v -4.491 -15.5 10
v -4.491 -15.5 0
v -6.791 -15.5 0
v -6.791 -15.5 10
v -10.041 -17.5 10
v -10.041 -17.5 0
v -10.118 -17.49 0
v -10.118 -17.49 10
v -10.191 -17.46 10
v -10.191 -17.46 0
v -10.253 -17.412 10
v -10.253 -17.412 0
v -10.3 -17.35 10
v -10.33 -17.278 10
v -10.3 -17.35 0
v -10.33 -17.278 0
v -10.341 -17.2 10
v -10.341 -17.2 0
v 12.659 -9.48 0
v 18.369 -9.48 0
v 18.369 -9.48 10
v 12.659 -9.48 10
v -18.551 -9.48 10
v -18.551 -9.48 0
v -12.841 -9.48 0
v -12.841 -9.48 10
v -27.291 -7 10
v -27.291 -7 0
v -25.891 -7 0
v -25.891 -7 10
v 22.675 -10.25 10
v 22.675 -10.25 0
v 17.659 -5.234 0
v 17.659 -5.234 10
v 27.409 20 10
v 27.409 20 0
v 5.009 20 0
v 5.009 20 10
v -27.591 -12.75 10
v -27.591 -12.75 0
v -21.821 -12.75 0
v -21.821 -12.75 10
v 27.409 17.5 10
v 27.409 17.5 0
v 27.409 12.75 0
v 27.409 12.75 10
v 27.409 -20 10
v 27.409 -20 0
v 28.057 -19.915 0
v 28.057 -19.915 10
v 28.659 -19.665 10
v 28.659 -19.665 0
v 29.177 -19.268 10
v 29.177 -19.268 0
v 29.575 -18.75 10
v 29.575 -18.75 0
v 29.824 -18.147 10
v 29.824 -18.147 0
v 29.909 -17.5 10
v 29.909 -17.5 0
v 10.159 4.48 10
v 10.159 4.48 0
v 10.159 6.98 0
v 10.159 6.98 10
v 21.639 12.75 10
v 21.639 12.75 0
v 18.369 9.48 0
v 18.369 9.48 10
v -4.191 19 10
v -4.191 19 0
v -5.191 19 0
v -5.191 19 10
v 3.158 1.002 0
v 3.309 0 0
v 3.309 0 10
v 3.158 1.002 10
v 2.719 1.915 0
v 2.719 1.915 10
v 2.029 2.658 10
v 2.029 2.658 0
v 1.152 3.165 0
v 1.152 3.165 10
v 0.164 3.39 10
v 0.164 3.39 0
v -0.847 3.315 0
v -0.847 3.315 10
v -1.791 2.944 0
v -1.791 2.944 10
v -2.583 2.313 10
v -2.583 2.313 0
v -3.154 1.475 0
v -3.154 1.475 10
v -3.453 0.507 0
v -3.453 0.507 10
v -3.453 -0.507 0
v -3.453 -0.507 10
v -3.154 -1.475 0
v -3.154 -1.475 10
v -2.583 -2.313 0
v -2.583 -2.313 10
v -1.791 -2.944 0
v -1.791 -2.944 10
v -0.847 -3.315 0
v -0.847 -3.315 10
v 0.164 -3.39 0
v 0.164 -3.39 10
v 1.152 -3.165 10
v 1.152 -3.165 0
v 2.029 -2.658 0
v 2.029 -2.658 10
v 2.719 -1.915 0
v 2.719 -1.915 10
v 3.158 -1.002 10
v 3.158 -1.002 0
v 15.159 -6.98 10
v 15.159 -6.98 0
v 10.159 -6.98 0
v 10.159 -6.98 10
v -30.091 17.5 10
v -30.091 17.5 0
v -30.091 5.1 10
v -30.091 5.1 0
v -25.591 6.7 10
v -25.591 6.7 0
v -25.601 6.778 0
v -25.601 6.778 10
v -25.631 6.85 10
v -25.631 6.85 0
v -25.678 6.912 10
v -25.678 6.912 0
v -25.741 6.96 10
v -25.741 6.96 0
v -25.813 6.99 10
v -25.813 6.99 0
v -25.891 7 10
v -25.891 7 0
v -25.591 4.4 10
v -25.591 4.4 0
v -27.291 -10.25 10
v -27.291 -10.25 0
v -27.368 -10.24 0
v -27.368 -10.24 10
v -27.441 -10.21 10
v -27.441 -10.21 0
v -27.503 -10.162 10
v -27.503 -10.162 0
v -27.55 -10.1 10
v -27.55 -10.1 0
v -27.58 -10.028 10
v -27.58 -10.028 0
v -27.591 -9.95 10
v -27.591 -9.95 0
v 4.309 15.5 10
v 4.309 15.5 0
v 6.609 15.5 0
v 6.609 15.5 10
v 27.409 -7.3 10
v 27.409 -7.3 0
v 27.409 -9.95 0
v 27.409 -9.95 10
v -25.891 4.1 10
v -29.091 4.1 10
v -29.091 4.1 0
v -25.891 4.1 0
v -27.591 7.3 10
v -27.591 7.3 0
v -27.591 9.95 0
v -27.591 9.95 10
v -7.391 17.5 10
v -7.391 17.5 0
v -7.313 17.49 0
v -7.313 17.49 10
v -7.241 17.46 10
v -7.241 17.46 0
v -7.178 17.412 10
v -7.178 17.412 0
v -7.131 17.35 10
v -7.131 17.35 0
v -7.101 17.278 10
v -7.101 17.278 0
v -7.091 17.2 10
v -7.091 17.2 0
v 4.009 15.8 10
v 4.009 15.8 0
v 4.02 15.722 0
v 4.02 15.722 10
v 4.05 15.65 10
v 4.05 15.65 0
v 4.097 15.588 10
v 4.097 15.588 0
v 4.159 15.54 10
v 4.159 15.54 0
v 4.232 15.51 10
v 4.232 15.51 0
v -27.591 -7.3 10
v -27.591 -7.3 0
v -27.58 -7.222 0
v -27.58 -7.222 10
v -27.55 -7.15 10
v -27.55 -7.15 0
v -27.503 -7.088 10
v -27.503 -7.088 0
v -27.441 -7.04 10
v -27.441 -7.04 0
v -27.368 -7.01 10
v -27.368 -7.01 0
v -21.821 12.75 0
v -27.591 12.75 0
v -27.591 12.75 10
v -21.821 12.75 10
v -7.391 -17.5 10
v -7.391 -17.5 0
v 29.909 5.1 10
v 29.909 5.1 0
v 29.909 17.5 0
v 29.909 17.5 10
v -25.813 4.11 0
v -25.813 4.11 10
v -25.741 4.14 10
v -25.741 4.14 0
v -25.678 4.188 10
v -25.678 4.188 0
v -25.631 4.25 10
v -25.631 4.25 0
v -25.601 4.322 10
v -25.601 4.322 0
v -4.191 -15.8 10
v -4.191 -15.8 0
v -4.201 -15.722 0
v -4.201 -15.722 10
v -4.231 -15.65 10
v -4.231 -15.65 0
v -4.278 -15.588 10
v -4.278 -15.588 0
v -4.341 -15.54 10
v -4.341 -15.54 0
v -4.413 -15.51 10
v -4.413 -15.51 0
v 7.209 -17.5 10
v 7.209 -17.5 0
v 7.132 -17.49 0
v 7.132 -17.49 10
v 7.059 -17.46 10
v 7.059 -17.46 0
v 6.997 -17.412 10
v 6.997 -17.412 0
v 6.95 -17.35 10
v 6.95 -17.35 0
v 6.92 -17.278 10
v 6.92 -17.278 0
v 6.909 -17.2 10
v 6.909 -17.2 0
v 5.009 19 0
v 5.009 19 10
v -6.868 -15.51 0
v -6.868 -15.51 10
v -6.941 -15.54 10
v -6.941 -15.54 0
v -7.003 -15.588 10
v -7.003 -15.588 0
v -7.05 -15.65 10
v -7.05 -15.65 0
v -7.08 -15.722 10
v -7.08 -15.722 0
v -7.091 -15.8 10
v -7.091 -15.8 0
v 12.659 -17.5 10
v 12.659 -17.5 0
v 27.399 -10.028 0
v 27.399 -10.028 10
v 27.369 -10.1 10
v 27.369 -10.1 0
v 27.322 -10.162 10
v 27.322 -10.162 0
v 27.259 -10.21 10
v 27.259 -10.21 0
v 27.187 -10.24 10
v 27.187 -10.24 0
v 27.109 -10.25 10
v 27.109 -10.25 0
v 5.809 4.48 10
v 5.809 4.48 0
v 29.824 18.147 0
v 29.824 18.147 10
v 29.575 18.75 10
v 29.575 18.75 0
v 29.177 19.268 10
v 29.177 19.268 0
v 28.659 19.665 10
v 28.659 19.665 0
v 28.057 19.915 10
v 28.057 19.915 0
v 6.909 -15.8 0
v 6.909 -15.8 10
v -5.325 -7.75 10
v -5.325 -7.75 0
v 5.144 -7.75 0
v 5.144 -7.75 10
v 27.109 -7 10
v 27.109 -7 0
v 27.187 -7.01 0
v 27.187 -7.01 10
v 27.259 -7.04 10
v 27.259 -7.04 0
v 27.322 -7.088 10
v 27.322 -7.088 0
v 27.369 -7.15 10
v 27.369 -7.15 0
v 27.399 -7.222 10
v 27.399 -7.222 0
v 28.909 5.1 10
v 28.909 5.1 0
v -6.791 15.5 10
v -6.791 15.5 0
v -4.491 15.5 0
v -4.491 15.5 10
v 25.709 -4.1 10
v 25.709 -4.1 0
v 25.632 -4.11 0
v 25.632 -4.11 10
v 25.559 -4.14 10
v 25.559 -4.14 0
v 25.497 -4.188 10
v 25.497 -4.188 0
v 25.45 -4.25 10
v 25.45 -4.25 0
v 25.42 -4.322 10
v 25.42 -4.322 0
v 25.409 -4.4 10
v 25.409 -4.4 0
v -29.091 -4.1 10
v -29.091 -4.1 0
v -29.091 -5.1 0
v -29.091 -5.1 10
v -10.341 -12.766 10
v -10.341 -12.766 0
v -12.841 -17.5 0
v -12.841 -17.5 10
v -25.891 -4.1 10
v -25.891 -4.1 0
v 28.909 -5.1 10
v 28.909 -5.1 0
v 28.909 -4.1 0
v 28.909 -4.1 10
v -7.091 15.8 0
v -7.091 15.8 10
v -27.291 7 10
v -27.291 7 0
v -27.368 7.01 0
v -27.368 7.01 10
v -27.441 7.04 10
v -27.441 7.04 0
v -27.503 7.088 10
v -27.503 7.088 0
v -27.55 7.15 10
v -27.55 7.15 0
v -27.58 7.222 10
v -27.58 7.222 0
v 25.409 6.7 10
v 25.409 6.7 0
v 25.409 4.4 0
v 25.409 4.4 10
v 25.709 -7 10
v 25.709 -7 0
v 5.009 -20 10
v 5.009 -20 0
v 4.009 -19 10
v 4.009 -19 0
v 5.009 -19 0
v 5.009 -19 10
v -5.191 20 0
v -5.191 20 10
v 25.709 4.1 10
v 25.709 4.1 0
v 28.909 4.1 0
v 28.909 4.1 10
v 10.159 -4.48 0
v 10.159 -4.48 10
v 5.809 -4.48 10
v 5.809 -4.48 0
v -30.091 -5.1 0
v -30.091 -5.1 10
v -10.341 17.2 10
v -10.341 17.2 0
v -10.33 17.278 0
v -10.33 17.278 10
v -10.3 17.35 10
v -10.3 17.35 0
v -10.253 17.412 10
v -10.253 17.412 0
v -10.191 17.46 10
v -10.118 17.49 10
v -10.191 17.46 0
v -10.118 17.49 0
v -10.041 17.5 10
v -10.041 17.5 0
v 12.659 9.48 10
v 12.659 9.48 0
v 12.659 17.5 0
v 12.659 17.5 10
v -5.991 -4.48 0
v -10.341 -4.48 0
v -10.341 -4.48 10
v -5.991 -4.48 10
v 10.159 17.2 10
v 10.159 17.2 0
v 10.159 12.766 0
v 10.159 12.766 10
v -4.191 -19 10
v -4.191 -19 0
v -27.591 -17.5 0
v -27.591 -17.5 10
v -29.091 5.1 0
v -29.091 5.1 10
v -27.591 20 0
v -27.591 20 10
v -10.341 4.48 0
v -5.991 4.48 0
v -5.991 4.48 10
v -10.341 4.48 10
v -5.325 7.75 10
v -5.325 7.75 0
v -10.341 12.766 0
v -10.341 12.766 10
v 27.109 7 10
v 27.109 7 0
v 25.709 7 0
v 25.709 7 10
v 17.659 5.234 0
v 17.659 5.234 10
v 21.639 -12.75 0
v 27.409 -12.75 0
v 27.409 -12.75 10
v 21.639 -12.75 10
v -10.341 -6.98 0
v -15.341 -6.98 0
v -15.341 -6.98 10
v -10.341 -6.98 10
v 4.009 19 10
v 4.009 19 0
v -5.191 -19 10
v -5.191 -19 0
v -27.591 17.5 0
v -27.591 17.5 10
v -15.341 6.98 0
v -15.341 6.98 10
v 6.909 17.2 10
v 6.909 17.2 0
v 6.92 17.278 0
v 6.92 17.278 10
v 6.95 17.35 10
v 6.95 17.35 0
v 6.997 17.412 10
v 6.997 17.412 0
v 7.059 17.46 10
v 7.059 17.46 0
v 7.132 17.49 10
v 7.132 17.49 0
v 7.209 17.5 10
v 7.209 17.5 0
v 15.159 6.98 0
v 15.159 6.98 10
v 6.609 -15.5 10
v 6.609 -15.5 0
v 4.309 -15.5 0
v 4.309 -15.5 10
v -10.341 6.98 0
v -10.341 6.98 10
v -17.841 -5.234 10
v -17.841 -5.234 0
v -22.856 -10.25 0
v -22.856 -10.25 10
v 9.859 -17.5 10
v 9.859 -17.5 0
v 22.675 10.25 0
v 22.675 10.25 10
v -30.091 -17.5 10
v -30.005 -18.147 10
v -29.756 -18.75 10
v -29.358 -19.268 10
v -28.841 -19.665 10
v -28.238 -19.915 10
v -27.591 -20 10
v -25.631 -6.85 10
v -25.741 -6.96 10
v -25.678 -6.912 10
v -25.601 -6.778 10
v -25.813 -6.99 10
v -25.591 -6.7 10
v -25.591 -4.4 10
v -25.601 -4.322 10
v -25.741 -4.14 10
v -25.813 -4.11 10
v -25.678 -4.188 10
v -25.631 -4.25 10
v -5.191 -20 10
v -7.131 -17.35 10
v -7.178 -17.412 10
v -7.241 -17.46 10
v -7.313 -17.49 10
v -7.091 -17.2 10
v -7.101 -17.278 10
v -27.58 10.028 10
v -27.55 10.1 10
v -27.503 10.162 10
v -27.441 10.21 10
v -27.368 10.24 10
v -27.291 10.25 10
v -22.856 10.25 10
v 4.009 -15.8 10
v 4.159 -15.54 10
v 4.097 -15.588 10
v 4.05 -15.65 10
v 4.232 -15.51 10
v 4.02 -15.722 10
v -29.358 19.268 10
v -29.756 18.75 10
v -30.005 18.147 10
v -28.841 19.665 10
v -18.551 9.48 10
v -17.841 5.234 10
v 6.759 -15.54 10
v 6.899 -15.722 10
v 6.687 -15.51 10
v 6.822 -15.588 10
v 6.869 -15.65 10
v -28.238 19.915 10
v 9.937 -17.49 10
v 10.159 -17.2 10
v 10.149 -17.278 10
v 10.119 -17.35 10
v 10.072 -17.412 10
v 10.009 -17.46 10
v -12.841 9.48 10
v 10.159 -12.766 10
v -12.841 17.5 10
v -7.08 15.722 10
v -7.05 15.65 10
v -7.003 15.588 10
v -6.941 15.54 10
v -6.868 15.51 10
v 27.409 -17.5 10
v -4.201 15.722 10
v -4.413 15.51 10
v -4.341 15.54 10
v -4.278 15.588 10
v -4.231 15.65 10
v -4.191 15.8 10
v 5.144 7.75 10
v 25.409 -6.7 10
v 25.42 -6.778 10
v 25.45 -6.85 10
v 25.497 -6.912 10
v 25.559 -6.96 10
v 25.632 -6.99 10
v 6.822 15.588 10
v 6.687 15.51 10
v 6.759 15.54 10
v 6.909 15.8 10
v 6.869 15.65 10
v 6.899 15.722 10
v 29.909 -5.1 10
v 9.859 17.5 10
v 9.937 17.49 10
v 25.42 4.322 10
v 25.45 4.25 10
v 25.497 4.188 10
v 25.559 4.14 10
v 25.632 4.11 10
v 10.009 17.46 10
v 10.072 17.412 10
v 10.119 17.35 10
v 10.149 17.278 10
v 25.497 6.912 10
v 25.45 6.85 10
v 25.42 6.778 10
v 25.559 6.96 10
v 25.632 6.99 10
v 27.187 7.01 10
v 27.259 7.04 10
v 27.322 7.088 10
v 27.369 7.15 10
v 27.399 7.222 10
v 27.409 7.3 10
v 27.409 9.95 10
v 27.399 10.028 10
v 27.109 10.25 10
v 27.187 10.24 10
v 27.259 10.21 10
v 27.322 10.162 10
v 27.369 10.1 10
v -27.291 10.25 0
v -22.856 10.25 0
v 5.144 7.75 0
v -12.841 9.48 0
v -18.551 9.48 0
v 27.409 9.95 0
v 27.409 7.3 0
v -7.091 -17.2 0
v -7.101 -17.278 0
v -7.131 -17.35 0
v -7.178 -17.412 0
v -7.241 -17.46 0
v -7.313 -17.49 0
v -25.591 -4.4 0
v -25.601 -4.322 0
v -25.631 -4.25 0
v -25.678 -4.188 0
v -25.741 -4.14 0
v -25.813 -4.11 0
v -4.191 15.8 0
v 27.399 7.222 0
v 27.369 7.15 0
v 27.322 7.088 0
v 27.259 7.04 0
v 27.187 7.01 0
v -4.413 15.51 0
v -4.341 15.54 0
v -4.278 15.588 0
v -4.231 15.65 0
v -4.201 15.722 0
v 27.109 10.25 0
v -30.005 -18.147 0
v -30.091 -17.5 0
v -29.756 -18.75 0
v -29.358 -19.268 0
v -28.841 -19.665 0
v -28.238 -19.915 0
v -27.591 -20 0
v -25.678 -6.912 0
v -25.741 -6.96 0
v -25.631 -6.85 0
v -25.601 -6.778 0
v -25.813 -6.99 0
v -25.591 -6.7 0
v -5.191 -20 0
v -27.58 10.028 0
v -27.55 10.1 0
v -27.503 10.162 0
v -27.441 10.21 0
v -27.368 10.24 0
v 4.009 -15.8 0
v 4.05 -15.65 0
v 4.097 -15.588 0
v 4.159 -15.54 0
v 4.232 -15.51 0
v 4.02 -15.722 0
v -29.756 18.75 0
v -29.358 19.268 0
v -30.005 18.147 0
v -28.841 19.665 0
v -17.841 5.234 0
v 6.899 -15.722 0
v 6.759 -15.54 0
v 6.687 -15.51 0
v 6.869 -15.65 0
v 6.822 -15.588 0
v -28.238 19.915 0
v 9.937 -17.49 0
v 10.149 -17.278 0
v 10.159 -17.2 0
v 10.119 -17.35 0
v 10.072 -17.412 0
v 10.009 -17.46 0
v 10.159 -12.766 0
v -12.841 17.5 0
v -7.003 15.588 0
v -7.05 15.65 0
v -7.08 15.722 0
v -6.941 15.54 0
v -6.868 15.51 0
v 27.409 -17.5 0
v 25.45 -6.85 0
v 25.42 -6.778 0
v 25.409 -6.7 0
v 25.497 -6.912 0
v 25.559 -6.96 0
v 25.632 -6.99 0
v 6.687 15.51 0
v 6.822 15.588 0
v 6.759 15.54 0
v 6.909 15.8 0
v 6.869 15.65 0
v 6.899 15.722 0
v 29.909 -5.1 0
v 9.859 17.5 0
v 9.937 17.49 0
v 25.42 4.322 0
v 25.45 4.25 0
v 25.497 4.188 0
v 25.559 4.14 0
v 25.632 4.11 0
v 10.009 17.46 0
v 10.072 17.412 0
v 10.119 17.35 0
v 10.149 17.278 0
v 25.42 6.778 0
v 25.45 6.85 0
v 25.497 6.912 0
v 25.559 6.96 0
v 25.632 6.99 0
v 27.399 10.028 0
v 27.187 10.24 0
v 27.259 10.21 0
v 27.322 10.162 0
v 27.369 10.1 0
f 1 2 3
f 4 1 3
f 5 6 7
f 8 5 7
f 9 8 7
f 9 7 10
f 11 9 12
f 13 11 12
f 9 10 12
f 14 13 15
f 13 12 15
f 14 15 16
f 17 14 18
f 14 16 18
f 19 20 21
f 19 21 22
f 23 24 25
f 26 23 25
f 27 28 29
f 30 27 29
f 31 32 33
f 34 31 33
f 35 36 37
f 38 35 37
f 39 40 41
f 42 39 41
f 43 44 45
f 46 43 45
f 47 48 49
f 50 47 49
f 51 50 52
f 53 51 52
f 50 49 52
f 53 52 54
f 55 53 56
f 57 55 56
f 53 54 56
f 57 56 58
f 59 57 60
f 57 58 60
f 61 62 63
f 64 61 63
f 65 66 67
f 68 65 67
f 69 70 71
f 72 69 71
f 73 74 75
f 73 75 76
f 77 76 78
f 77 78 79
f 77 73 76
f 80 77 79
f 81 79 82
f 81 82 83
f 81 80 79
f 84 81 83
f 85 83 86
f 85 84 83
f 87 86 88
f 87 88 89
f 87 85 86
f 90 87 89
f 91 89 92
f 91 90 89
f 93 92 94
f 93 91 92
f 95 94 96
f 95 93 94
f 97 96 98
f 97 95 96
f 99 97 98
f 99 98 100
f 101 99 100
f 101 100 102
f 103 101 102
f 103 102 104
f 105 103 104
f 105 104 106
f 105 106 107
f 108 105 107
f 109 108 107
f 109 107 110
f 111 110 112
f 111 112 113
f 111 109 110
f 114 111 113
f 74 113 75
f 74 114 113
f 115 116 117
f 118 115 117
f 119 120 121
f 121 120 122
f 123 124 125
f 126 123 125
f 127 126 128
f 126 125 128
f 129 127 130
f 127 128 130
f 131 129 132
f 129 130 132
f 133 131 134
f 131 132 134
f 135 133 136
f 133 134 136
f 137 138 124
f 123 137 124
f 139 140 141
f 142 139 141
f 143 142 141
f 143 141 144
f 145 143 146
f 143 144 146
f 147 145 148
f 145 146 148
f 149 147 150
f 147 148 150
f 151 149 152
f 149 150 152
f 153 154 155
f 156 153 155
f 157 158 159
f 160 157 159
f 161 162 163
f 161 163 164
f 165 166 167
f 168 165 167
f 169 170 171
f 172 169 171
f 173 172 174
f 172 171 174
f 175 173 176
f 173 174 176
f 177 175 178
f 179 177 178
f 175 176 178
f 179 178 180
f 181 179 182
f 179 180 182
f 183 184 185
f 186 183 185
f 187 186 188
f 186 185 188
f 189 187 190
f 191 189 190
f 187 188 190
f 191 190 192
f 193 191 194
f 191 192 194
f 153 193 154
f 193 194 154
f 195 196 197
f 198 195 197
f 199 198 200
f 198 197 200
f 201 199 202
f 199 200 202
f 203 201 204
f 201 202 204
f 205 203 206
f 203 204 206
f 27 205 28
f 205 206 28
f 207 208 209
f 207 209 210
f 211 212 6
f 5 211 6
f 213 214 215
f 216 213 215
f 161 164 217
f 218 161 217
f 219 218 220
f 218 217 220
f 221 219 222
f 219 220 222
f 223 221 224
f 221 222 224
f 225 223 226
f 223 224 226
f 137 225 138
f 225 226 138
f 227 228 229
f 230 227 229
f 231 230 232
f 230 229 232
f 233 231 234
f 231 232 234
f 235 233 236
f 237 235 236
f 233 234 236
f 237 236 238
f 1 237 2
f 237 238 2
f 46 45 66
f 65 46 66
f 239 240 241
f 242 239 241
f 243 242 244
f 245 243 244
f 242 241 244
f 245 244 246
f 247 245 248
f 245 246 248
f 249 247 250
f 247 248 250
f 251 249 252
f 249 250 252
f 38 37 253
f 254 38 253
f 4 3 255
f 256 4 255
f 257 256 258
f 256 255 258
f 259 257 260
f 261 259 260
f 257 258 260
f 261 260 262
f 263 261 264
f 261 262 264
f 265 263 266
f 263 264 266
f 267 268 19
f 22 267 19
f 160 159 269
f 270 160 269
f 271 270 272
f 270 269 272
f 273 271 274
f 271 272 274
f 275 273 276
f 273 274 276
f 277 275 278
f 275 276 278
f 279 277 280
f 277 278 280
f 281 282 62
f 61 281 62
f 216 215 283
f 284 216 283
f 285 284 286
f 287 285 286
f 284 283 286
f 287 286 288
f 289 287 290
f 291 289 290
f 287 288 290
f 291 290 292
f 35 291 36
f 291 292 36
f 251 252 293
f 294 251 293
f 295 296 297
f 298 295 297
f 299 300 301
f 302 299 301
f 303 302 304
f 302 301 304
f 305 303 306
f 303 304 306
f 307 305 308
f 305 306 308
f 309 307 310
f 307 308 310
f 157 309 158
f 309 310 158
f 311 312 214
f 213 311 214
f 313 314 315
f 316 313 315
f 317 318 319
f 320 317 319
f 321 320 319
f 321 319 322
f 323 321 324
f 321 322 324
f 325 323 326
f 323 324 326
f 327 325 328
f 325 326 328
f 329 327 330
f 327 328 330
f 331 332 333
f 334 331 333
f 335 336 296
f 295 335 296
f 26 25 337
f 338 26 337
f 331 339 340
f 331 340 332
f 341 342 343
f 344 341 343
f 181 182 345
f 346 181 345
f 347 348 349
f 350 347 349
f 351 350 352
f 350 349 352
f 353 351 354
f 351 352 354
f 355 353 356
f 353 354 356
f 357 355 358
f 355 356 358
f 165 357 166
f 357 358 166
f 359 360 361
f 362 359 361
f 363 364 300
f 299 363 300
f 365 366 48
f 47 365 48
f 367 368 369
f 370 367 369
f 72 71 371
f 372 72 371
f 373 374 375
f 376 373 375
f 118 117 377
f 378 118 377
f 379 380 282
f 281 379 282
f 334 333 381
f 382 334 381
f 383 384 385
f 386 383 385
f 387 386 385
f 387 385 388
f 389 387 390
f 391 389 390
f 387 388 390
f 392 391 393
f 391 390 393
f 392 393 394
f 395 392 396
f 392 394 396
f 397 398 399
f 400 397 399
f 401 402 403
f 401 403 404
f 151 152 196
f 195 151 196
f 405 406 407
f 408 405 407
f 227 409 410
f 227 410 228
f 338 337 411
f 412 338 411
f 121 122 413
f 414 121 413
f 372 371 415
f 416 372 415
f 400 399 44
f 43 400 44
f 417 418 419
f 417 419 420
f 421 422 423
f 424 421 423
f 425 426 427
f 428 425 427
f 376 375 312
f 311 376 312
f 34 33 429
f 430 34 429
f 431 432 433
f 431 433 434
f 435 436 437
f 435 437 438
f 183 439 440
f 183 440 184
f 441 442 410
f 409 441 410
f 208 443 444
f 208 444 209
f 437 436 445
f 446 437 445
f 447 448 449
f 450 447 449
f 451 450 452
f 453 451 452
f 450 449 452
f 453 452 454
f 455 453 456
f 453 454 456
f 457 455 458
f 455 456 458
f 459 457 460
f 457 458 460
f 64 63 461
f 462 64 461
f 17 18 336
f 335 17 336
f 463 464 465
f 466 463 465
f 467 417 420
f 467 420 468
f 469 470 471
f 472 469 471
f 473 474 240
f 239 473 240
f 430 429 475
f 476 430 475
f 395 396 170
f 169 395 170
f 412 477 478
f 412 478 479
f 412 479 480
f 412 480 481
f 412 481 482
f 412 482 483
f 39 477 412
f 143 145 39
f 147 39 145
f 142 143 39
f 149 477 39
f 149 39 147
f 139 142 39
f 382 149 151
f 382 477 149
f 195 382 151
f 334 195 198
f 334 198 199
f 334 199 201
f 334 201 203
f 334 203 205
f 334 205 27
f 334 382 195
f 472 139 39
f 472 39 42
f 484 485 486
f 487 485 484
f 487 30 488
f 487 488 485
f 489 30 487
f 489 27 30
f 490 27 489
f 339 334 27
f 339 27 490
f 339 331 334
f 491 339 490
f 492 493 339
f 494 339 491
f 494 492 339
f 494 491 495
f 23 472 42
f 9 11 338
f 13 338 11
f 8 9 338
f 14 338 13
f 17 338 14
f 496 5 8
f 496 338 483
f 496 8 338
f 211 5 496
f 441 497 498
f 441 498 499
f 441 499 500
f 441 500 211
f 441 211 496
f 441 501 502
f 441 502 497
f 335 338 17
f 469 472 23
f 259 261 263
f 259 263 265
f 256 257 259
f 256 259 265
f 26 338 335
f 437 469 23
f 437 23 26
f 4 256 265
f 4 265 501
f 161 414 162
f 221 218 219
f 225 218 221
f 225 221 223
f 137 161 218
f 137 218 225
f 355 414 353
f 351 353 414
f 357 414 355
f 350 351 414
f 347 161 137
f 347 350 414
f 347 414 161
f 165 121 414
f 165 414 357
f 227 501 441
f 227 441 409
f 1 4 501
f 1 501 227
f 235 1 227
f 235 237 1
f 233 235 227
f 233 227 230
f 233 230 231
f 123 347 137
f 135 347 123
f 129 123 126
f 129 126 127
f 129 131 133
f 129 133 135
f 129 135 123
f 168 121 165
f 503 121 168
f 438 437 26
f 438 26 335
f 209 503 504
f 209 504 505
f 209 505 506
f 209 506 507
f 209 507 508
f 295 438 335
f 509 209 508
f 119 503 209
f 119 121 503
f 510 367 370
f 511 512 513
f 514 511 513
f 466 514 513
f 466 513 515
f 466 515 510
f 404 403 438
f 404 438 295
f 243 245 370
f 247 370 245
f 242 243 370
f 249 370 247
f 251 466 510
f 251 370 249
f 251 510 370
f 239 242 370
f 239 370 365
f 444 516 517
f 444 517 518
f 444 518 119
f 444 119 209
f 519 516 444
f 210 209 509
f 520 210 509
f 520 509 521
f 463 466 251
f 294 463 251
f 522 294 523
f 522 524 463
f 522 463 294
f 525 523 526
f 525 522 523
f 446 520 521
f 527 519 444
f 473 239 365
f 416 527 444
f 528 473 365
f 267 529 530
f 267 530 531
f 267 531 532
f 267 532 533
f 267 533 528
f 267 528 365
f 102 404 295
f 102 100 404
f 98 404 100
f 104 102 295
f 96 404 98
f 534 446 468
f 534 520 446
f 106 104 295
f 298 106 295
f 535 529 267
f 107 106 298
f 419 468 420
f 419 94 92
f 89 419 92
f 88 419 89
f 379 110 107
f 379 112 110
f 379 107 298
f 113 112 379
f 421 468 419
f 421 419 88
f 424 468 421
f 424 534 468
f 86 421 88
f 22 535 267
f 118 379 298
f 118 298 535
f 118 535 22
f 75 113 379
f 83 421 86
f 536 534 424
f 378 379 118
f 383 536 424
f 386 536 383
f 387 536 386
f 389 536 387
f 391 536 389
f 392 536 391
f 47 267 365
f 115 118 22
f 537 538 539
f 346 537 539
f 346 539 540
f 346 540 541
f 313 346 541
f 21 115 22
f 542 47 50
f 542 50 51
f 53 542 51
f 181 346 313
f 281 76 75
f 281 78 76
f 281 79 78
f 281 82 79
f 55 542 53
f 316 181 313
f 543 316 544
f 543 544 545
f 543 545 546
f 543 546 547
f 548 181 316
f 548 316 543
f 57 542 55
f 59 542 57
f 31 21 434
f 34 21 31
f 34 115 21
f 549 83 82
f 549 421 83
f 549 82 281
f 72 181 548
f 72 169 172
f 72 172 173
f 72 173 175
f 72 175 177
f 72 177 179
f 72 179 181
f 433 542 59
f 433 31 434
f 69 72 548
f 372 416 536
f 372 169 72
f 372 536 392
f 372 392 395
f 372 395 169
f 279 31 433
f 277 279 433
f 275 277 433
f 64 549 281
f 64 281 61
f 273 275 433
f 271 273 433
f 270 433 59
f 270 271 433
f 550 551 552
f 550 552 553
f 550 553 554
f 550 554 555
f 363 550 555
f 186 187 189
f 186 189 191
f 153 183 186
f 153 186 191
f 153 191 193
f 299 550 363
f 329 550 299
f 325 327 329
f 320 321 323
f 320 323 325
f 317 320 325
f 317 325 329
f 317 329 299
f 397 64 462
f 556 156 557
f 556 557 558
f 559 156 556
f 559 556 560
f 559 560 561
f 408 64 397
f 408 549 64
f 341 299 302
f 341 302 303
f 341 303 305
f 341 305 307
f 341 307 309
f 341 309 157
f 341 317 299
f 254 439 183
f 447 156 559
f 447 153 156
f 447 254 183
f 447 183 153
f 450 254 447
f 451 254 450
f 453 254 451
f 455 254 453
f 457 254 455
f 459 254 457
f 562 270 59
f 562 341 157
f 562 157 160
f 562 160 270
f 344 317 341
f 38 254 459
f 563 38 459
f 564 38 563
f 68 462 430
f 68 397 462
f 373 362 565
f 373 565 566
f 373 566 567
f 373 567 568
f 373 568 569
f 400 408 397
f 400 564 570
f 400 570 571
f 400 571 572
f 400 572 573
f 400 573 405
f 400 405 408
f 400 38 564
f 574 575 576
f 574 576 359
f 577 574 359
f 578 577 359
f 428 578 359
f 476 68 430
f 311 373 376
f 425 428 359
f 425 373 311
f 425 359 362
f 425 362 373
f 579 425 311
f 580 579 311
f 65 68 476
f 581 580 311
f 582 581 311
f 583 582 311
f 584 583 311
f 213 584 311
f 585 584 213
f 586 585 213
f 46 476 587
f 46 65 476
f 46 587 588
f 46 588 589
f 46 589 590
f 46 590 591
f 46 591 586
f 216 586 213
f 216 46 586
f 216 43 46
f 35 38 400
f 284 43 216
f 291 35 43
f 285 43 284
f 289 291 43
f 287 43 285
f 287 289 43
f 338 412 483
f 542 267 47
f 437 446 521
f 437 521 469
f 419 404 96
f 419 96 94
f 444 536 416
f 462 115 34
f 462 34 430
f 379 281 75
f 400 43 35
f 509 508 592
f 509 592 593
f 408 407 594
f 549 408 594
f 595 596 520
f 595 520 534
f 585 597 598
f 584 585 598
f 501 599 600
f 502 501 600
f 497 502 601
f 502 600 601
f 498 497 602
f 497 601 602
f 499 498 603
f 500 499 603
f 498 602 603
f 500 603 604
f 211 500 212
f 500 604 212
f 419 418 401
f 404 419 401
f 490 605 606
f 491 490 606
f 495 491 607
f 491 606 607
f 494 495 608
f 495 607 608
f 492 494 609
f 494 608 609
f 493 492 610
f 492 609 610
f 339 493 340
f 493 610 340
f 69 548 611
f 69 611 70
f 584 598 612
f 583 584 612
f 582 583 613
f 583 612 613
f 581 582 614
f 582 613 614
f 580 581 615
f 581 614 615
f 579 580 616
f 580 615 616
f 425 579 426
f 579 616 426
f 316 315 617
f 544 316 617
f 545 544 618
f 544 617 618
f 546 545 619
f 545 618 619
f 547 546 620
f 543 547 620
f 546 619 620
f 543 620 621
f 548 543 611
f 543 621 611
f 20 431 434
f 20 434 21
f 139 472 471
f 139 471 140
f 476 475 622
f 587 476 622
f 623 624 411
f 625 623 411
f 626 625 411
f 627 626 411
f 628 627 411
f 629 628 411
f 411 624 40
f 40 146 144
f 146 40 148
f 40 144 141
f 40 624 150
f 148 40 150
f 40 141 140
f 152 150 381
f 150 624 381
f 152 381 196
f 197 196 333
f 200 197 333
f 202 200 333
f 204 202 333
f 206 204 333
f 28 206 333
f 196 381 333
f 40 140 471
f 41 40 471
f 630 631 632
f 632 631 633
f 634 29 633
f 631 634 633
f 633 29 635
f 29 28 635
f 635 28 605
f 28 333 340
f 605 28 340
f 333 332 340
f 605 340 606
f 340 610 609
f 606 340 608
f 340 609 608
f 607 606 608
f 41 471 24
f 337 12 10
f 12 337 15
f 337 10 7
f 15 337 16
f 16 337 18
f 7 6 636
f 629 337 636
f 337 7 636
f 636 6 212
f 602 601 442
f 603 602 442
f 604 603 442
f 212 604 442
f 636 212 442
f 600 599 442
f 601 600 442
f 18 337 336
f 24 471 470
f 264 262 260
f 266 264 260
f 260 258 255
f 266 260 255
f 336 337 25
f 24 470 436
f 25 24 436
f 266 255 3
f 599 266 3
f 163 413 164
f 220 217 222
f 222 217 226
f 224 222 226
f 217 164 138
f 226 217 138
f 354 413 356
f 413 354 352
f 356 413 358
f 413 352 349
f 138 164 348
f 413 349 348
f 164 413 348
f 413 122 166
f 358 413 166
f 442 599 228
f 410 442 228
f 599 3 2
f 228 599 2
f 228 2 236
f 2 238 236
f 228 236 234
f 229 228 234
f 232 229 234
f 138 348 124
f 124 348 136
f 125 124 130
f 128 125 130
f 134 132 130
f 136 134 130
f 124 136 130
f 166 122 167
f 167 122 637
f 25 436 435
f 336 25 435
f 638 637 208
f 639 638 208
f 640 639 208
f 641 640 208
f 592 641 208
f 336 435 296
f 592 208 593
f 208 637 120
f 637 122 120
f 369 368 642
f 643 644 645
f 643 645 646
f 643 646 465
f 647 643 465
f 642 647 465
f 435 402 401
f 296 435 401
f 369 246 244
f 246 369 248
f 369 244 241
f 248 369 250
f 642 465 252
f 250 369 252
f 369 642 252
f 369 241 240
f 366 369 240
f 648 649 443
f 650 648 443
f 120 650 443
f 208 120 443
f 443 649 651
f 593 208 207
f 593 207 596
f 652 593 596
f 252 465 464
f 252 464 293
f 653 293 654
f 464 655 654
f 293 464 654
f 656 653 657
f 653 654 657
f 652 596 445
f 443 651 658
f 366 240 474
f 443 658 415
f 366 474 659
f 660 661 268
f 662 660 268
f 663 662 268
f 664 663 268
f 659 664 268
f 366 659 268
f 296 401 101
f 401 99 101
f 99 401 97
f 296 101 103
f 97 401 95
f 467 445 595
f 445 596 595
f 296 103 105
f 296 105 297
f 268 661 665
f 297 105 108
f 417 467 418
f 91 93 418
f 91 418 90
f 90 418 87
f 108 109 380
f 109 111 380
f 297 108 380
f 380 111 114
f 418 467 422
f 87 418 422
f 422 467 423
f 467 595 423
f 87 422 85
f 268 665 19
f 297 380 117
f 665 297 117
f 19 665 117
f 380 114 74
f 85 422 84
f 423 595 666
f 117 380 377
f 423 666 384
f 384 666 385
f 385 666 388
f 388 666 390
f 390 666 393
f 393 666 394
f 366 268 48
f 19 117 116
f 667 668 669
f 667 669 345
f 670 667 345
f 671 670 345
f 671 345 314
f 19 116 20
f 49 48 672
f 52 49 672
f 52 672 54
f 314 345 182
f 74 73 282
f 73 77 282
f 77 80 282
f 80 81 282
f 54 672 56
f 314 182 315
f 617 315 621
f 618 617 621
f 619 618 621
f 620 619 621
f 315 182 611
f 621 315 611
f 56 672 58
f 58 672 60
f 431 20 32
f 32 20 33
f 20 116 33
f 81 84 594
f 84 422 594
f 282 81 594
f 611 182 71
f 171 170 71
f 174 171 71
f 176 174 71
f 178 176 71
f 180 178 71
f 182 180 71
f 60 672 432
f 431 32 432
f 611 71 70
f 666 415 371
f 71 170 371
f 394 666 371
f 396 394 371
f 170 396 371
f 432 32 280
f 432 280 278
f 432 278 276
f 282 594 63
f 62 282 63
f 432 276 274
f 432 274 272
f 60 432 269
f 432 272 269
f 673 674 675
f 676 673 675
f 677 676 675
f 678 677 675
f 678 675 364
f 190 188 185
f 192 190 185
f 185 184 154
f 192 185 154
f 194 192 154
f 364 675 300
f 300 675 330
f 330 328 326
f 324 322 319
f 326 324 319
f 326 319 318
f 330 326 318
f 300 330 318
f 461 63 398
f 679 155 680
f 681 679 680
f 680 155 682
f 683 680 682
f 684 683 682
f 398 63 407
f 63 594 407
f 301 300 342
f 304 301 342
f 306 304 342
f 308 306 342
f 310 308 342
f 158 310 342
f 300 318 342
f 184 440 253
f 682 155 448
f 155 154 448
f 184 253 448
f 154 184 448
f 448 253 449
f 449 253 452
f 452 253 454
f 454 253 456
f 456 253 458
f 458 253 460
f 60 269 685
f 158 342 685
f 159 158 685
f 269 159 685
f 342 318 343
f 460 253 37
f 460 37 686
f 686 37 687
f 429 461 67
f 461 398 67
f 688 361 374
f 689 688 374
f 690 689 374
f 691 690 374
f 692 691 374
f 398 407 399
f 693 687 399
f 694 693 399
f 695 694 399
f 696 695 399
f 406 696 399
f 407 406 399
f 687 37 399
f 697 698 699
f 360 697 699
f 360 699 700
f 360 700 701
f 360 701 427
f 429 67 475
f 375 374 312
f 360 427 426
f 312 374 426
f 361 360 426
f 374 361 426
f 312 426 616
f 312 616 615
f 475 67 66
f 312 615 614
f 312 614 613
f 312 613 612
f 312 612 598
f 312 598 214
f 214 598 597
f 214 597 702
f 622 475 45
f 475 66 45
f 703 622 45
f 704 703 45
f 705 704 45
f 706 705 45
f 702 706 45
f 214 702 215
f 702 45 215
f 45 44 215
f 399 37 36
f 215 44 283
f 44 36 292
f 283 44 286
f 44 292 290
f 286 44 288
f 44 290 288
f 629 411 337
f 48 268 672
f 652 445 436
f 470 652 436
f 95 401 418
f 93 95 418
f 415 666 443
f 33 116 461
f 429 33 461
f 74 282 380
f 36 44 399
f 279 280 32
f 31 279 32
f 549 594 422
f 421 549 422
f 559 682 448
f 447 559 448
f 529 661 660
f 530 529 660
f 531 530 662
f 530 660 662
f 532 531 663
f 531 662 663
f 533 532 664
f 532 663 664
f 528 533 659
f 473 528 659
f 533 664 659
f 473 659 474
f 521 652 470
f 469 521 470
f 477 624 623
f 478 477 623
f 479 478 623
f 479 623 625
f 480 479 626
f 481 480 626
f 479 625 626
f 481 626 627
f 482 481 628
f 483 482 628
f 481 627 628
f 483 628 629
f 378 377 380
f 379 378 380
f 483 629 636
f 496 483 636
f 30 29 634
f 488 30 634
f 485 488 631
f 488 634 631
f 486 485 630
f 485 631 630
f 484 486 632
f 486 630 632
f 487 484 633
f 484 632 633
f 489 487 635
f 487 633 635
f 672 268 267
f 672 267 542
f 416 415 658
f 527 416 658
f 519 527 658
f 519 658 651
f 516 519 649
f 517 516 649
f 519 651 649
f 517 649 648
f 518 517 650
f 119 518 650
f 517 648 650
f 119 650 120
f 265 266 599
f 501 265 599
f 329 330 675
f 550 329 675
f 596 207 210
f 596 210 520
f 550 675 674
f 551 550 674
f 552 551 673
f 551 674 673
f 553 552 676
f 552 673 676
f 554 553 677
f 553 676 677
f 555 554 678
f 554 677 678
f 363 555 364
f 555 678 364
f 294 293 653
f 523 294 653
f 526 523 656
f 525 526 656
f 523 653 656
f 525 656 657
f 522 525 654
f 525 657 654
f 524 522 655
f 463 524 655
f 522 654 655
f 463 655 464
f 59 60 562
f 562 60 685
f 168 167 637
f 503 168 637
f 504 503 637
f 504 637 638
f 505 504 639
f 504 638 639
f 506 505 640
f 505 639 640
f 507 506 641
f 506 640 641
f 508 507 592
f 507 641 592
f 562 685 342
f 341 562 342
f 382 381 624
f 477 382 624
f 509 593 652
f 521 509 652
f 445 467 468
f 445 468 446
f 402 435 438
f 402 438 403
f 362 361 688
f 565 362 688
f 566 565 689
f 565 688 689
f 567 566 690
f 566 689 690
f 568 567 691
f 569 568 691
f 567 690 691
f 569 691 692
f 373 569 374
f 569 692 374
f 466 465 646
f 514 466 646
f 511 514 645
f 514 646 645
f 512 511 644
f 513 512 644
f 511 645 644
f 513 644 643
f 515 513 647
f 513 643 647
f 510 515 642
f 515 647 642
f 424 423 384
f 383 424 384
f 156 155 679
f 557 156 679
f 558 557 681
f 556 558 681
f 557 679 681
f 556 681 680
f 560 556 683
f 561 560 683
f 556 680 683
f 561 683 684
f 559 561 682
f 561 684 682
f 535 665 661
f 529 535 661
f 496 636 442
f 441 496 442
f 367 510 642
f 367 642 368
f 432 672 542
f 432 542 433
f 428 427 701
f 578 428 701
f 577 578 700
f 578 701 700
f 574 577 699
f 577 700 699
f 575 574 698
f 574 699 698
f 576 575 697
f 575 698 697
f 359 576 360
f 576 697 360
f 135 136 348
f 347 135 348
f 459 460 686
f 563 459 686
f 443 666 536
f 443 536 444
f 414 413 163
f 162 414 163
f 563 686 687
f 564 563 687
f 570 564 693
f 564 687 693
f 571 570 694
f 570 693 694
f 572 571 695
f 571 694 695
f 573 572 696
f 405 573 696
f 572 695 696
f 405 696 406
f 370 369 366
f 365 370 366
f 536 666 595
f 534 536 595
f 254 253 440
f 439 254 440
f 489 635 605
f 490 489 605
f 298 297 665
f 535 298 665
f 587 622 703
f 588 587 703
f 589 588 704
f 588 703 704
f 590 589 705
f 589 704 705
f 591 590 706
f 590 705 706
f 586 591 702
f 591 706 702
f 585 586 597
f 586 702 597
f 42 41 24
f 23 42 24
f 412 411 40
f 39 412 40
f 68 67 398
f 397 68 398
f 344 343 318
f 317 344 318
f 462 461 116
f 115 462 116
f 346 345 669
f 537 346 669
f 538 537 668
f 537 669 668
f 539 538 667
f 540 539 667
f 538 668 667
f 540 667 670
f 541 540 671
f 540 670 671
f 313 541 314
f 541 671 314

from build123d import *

# Parameters (mm, degrees)
SKETCH_1_R      = 3.4
EXTRUDE_1_DEPTH = 10


with BuildPart() as part:
    # 草图1 → 凸台-拉伸1 (new body)
    with BuildSketch(Plane.XY):
        with BuildLine():
            Line((-5.190537873, 20), (-27.590537873, 20))
            ThreePointArc((-27.590537873, 20), (-29.358304826, 19.267766953), (-30.090537873, 17.5))
            Line((-30.090537873, 17.5), (-30.090537873, 5.1))
            Line((-30.090537873, 5.1), (-29.090537873, 5.1))
            Line((-29.090537873, 5.1), (-29.090537873, 4.1))
            Line((-29.090537873, 4.1), (-25.890537873, 4.1))
            ThreePointArc((-25.890537873, 4.1), (-25.678405839, 4.187867966), (-25.590537873, 4.4))
            Line((-25.590537873, 4.4), (-25.590537873, 6.7))
            ThreePointArc((-25.590537873, 6.7), (-25.678405839, 6.912132034), (-25.890537873, 7))
            Line((-25.890537873, 7), (-27.290537873, 7))
            ThreePointArc((-27.290537873, 7), (-27.502669908, 7.087867966), (-27.590537873, 7.3))
            Line((-27.590537873, 7.3), (-27.590537873, 9.95))
            ThreePointArc((-27.590537873, 9.95), (-27.502669908, 10.162132034), (-27.290537873, 10.25))
            Line((-27.290537873, 10.25), (-22.856071779, 10.25))
            Line((-22.856071779, 10.25), (-17.840537873, 5.234466094))
            Line((-17.840537873, 5.234466094), (-17.840537873, 0))
            Line((-17.840537873, 0), (-17.840537873, -5.234466094))
            Line((-17.840537873, -5.234466094), (-22.856071779, -10.25))
            Line((-22.856071779, -10.25), (-27.290537873, -10.25))
            ThreePointArc((-27.290537873, -10.25), (-27.502669908, -10.162132034), (-27.590537873, -9.95))
            Line((-27.590537873, -9.95), (-27.590537873, -7.3))
            ThreePointArc((-27.590537873, -7.3), (-27.502669908, -7.087867966), (-27.290537873, -7))
            Line((-27.290537873, -7), (-25.890537873, -7))
            ThreePointArc((-25.890537873, -7), (-25.678405839, -6.912132034), (-25.590537873, -6.7))
            Line((-25.590537873, -6.7), (-25.590537873, -4.4))
            ThreePointArc((-25.590537873, -4.4), (-25.678405839, -4.187867966), (-25.890537873, -4.1))
            Line((-25.890537873, -4.1), (-29.090537873, -4.1))
            Line((-29.090537873, -4.1), (-29.090537873, -5.1))
            Line((-29.090537873, -5.1), (-30.090537873, -5.1))
            Line((-30.090537873, -5.1), (-30.090537873, -17.5))
            ThreePointArc((-30.090537873, -17.5), (-29.358304826, -19.267766953), (-27.590537873, -20))
            Line((-27.590537873, -20), (-5.190537873, -20))
            Line((-5.190537873, -20), (-5.190537873, -19))
            Line((-5.190537873, -19), (-4.190537873, -19))
            Line((-4.190537873, -19), (-4.190537873, -15.8))
            ThreePointArc((-4.190537873, -15.8), (-4.278405839, -15.587867966), (-4.490537873, -15.5))
            Line((-4.490537873, -15.5), (-6.790537873, -15.5))
            ThreePointArc((-6.790537873, -15.5), (-7.002669908, -15.587867966), (-7.090537873, -15.8))
            Line((-7.090537873, -15.8), (-7.090537873, -17.2))
            ThreePointArc((-7.090537873, -17.2), (-7.178405839, -17.412132034), (-7.390537873, -17.5))
            Line((-7.390537873, -17.5), (-10.040537873, -17.5))
            ThreePointArc((-10.040537873, -17.5), (-10.252669908, -17.412132034), (-10.340537873, -17.2))
            Line((-10.340537873, -17.2), (-10.340537873, -12.765533906))
            Line((-10.340537873, -12.765533906), (-5.325003967, -7.75))
            Line((-5.325003967, -7.75), (-0.090537873, -7.75))
            Line((-0.090537873, -7.75), (5.143928221, -7.75))
            Line((5.143928221, -7.75), (10.159462127, -12.765533906))
            Line((10.159462127, -12.765533906), (10.159462127, -17.2))
            ThreePointArc((10.159462127, -17.2), (10.071594161, -17.412132034), (9.859462127, -17.5))
            Line((9.859462127, -17.5), (7.209462127, -17.5))
            ThreePointArc((7.209462127, -17.5), (6.997330092, -17.412132034), (6.909462127, -17.2))
            Line((6.909462127, -17.2), (6.909462127, -15.8))
            ThreePointArc((6.909462127, -15.8), (6.821594161, -15.587867966), (6.609462127, -15.5))
            Line((6.609462127, -15.5), (4.309462127, -15.5))
            ThreePointArc((4.309462127, -15.5), (4.097330092, -15.587867966), (4.009462127, -15.8))
            Line((4.009462127, -15.8), (4.009462127, -19))
            Line((4.009462127, -19), (5.009462127, -19))
            Line((5.009462127, -19), (5.009462127, -20))
            Line((5.009462127, -20), (27.409462127, -20))
            ThreePointArc((27.409462127, -20), (29.17722908, -19.267766953), (29.909462127, -17.5))
            Line((29.909462127, -17.5), (29.909462127, -5.1))
            Line((29.909462127, -5.1), (28.909462127, -5.1))
            Line((28.909462127, -5.1), (28.909462127, -4.1))
            Line((28.909462127, -4.1), (25.709462127, -4.1))
            ThreePointArc((25.709462127, -4.1), (25.497330092, -4.187867966), (25.409462127, -4.4))
            Line((25.409462127, -4.4), (25.409462127, -6.7))
            ThreePointArc((25.409462127, -6.7), (25.497330092, -6.912132034), (25.709462127, -7))
            Line((25.709462127, -7), (27.109462127, -7))
            ThreePointArc((27.109462127, -7), (27.321594161, -7.087867966), (27.409462127, -7.3))
            Line((27.409462127, -7.3), (27.409462127, -9.95))
            ThreePointArc((27.409462127, -9.95), (27.321594161, -10.162132034), (27.109462127, -10.25))
            Line((27.109462127, -10.25), (22.674996033, -10.25))
            Line((22.674996033, -10.25), (17.659462127, -5.234466094))
            Line((17.659462127, -5.234466094), (17.659462127, 0))
            Line((17.659462127, 0), (17.659462127, 5.234466094))
            Line((17.659462127, 5.234466094), (22.674996033, 10.25))
            Line((22.674996033, 10.25), (27.109462127, 10.25))
            ThreePointArc((27.109462127, 10.25), (27.321594161, 10.162132034), (27.409462127, 9.95))
            Line((27.409462127, 9.95), (27.409462127, 7.3))
            ThreePointArc((27.409462127, 7.3), (27.321594161, 7.087867966), (27.109462127, 7))
            Line((27.109462127, 7), (25.709462127, 7))
            ThreePointArc((25.709462127, 7), (25.497330092, 6.912132034), (25.409462127, 6.7))
            Line((25.409462127, 6.7), (25.409462127, 4.4))
            ThreePointArc((25.409462127, 4.4), (25.497330092, 4.187867966), (25.709462127, 4.1))
            Line((25.709462127, 4.1), (28.909462127, 4.1))
            Line((28.909462127, 4.1), (28.909462127, 5.1))
            Line((28.909462127, 5.1), (29.909462127, 5.1))
            Line((29.909462127, 5.1), (29.909462127, 17.5))
            ThreePointArc((29.909462127, 17.5), (29.17722908, 19.267766953), (27.409462127, 20))
            Line((27.409462127, 20), (5.009462127, 20))
            Line((5.009462127, 20), (5.009462127, 19))
            Line((5.009462127, 19), (4.009462127, 19))
            Line((4.009462127, 19), (4.009462127, 15.8))
            ThreePointArc((4.009462127, 15.8), (4.097330092, 15.587867966), (4.309462127, 15.5))
            Line((4.309462127, 15.5), (6.609462127, 15.5))
            ThreePointArc((6.609462127, 15.5), (6.821594161, 15.587867966), (6.909462127, 15.8))
            Line((6.909462127, 15.8), (6.909462127, 17.2))
            ThreePointArc((6.909462127, 17.2), (6.997330092, 17.412132034), (7.209462127, 17.5))
            Line((7.209462127, 17.5), (9.859462127, 17.5))
            ThreePointArc((9.859462127, 17.5), (10.071594161, 17.412132034), (10.159462127, 17.2))
            Line((10.159462127, 17.2), (10.159462127, 12.765533906))
            Line((10.159462127, 12.765533906), (5.143928221, 7.75))
            Line((5.143928221, 7.75), (-0.090537873, 7.75))
            Line((-0.090537873, 7.75), (-5.325003967, 7.75))
            Line((-5.325003967, 7.75), (-10.340537873, 12.765533906))
            Line((-10.340537873, 12.765533906), (-10.340537873, 17.2))
            ThreePointArc((-10.340537873, 17.2), (-10.252669908, 17.412132034), (-10.040537873, 17.5))
            Line((-10.040537873, 17.5), (-7.390537873, 17.5))
            ThreePointArc((-7.390537873, 17.5), (-7.178405839, 17.412132034), (-7.090537873, 17.2))
            Line((-7.090537873, 17.2), (-7.090537873, 15.8))
            ThreePointArc((-7.090537873, 15.8), (-7.002669908, 15.587867966), (-6.790537873, 15.5))
            Line((-6.790537873, 15.5), (-4.490537873, 15.5))
            ThreePointArc((-4.490537873, 15.5), (-4.278405839, 15.587867966), (-4.190537873, 15.8))
            Line((-4.190537873, 15.8), (-4.190537873, 19))
            Line((-4.190537873, 19), (-5.190537873, 19))
            Line((-5.190537873, 19), (-5.190537873, 20))
        make_face()
        with Locations((-0.090537873, 0)):
            Circle(SKETCH_1_R, mode=Mode.SUBTRACT)
        Polygon((-12.840537873, 17.5), (-27.590537873, 17.5), (-27.590537873, 12.75), (-21.820537873, 12.75), (-18.550537873, 9.48), (-12.840537873, 9.48), (-12.840537873, 10.25), (-12.840537873, 12.75), align=None, mode=Mode.SUBTRACT)
        Polygon((-15.340537873, 6.98), (-15.340537873, 0), (-15.340537873, -6.98), (-10.340537873, -6.98), (-10.340537873, -4.48), (-5.990537873, -4.48), (-5.990537873, 0), (-5.990537873, 4.48), (-10.340537873, 4.48), (-10.340537873, 6.98), align=None, mode=Mode.SUBTRACT)
        Polygon((12.659462127, 17.5), (27.409462127, 17.5), (27.409462127, 12.75), (21.639462127, 12.75), (18.369462127, 9.48), (12.659462127, 9.48), (12.659462127, 10.25), (12.659462127, 12.75), align=None, mode=Mode.SUBTRACT)
        Polygon((15.159462127, 6.98), (15.159462127, 0), (15.159462127, -6.98), (10.159462127, -6.98), (10.159462127, -4.48), (5.809462127, -4.48), (5.809462127, 0), (5.809462127, 4.48), (10.159462127, 4.48), (10.159462127, 6.98), align=None, mode=Mode.SUBTRACT)
        Polygon((-12.840537873, -17.5), (-27.590537873, -17.5), (-27.590537873, -12.75), (-21.820537873, -12.75), (-18.550537873, -9.48), (-12.840537873, -9.48), (-12.840537873, -10.25), (-12.840537873, -12.75), align=None, mode=Mode.SUBTRACT)
        Polygon((12.659462127, -17.5), (27.409462127, -17.5), (27.409462127, -12.75), (21.639462127, -12.75), (18.369462127, -9.48), (12.659462127, -9.48), (12.659462127, -10.25), (12.659462127, -12.75), align=None, mode=Mode.SUBTRACT)
    extrude(amount=EXTRUDE_1_DEPTH)


solid = part.part
